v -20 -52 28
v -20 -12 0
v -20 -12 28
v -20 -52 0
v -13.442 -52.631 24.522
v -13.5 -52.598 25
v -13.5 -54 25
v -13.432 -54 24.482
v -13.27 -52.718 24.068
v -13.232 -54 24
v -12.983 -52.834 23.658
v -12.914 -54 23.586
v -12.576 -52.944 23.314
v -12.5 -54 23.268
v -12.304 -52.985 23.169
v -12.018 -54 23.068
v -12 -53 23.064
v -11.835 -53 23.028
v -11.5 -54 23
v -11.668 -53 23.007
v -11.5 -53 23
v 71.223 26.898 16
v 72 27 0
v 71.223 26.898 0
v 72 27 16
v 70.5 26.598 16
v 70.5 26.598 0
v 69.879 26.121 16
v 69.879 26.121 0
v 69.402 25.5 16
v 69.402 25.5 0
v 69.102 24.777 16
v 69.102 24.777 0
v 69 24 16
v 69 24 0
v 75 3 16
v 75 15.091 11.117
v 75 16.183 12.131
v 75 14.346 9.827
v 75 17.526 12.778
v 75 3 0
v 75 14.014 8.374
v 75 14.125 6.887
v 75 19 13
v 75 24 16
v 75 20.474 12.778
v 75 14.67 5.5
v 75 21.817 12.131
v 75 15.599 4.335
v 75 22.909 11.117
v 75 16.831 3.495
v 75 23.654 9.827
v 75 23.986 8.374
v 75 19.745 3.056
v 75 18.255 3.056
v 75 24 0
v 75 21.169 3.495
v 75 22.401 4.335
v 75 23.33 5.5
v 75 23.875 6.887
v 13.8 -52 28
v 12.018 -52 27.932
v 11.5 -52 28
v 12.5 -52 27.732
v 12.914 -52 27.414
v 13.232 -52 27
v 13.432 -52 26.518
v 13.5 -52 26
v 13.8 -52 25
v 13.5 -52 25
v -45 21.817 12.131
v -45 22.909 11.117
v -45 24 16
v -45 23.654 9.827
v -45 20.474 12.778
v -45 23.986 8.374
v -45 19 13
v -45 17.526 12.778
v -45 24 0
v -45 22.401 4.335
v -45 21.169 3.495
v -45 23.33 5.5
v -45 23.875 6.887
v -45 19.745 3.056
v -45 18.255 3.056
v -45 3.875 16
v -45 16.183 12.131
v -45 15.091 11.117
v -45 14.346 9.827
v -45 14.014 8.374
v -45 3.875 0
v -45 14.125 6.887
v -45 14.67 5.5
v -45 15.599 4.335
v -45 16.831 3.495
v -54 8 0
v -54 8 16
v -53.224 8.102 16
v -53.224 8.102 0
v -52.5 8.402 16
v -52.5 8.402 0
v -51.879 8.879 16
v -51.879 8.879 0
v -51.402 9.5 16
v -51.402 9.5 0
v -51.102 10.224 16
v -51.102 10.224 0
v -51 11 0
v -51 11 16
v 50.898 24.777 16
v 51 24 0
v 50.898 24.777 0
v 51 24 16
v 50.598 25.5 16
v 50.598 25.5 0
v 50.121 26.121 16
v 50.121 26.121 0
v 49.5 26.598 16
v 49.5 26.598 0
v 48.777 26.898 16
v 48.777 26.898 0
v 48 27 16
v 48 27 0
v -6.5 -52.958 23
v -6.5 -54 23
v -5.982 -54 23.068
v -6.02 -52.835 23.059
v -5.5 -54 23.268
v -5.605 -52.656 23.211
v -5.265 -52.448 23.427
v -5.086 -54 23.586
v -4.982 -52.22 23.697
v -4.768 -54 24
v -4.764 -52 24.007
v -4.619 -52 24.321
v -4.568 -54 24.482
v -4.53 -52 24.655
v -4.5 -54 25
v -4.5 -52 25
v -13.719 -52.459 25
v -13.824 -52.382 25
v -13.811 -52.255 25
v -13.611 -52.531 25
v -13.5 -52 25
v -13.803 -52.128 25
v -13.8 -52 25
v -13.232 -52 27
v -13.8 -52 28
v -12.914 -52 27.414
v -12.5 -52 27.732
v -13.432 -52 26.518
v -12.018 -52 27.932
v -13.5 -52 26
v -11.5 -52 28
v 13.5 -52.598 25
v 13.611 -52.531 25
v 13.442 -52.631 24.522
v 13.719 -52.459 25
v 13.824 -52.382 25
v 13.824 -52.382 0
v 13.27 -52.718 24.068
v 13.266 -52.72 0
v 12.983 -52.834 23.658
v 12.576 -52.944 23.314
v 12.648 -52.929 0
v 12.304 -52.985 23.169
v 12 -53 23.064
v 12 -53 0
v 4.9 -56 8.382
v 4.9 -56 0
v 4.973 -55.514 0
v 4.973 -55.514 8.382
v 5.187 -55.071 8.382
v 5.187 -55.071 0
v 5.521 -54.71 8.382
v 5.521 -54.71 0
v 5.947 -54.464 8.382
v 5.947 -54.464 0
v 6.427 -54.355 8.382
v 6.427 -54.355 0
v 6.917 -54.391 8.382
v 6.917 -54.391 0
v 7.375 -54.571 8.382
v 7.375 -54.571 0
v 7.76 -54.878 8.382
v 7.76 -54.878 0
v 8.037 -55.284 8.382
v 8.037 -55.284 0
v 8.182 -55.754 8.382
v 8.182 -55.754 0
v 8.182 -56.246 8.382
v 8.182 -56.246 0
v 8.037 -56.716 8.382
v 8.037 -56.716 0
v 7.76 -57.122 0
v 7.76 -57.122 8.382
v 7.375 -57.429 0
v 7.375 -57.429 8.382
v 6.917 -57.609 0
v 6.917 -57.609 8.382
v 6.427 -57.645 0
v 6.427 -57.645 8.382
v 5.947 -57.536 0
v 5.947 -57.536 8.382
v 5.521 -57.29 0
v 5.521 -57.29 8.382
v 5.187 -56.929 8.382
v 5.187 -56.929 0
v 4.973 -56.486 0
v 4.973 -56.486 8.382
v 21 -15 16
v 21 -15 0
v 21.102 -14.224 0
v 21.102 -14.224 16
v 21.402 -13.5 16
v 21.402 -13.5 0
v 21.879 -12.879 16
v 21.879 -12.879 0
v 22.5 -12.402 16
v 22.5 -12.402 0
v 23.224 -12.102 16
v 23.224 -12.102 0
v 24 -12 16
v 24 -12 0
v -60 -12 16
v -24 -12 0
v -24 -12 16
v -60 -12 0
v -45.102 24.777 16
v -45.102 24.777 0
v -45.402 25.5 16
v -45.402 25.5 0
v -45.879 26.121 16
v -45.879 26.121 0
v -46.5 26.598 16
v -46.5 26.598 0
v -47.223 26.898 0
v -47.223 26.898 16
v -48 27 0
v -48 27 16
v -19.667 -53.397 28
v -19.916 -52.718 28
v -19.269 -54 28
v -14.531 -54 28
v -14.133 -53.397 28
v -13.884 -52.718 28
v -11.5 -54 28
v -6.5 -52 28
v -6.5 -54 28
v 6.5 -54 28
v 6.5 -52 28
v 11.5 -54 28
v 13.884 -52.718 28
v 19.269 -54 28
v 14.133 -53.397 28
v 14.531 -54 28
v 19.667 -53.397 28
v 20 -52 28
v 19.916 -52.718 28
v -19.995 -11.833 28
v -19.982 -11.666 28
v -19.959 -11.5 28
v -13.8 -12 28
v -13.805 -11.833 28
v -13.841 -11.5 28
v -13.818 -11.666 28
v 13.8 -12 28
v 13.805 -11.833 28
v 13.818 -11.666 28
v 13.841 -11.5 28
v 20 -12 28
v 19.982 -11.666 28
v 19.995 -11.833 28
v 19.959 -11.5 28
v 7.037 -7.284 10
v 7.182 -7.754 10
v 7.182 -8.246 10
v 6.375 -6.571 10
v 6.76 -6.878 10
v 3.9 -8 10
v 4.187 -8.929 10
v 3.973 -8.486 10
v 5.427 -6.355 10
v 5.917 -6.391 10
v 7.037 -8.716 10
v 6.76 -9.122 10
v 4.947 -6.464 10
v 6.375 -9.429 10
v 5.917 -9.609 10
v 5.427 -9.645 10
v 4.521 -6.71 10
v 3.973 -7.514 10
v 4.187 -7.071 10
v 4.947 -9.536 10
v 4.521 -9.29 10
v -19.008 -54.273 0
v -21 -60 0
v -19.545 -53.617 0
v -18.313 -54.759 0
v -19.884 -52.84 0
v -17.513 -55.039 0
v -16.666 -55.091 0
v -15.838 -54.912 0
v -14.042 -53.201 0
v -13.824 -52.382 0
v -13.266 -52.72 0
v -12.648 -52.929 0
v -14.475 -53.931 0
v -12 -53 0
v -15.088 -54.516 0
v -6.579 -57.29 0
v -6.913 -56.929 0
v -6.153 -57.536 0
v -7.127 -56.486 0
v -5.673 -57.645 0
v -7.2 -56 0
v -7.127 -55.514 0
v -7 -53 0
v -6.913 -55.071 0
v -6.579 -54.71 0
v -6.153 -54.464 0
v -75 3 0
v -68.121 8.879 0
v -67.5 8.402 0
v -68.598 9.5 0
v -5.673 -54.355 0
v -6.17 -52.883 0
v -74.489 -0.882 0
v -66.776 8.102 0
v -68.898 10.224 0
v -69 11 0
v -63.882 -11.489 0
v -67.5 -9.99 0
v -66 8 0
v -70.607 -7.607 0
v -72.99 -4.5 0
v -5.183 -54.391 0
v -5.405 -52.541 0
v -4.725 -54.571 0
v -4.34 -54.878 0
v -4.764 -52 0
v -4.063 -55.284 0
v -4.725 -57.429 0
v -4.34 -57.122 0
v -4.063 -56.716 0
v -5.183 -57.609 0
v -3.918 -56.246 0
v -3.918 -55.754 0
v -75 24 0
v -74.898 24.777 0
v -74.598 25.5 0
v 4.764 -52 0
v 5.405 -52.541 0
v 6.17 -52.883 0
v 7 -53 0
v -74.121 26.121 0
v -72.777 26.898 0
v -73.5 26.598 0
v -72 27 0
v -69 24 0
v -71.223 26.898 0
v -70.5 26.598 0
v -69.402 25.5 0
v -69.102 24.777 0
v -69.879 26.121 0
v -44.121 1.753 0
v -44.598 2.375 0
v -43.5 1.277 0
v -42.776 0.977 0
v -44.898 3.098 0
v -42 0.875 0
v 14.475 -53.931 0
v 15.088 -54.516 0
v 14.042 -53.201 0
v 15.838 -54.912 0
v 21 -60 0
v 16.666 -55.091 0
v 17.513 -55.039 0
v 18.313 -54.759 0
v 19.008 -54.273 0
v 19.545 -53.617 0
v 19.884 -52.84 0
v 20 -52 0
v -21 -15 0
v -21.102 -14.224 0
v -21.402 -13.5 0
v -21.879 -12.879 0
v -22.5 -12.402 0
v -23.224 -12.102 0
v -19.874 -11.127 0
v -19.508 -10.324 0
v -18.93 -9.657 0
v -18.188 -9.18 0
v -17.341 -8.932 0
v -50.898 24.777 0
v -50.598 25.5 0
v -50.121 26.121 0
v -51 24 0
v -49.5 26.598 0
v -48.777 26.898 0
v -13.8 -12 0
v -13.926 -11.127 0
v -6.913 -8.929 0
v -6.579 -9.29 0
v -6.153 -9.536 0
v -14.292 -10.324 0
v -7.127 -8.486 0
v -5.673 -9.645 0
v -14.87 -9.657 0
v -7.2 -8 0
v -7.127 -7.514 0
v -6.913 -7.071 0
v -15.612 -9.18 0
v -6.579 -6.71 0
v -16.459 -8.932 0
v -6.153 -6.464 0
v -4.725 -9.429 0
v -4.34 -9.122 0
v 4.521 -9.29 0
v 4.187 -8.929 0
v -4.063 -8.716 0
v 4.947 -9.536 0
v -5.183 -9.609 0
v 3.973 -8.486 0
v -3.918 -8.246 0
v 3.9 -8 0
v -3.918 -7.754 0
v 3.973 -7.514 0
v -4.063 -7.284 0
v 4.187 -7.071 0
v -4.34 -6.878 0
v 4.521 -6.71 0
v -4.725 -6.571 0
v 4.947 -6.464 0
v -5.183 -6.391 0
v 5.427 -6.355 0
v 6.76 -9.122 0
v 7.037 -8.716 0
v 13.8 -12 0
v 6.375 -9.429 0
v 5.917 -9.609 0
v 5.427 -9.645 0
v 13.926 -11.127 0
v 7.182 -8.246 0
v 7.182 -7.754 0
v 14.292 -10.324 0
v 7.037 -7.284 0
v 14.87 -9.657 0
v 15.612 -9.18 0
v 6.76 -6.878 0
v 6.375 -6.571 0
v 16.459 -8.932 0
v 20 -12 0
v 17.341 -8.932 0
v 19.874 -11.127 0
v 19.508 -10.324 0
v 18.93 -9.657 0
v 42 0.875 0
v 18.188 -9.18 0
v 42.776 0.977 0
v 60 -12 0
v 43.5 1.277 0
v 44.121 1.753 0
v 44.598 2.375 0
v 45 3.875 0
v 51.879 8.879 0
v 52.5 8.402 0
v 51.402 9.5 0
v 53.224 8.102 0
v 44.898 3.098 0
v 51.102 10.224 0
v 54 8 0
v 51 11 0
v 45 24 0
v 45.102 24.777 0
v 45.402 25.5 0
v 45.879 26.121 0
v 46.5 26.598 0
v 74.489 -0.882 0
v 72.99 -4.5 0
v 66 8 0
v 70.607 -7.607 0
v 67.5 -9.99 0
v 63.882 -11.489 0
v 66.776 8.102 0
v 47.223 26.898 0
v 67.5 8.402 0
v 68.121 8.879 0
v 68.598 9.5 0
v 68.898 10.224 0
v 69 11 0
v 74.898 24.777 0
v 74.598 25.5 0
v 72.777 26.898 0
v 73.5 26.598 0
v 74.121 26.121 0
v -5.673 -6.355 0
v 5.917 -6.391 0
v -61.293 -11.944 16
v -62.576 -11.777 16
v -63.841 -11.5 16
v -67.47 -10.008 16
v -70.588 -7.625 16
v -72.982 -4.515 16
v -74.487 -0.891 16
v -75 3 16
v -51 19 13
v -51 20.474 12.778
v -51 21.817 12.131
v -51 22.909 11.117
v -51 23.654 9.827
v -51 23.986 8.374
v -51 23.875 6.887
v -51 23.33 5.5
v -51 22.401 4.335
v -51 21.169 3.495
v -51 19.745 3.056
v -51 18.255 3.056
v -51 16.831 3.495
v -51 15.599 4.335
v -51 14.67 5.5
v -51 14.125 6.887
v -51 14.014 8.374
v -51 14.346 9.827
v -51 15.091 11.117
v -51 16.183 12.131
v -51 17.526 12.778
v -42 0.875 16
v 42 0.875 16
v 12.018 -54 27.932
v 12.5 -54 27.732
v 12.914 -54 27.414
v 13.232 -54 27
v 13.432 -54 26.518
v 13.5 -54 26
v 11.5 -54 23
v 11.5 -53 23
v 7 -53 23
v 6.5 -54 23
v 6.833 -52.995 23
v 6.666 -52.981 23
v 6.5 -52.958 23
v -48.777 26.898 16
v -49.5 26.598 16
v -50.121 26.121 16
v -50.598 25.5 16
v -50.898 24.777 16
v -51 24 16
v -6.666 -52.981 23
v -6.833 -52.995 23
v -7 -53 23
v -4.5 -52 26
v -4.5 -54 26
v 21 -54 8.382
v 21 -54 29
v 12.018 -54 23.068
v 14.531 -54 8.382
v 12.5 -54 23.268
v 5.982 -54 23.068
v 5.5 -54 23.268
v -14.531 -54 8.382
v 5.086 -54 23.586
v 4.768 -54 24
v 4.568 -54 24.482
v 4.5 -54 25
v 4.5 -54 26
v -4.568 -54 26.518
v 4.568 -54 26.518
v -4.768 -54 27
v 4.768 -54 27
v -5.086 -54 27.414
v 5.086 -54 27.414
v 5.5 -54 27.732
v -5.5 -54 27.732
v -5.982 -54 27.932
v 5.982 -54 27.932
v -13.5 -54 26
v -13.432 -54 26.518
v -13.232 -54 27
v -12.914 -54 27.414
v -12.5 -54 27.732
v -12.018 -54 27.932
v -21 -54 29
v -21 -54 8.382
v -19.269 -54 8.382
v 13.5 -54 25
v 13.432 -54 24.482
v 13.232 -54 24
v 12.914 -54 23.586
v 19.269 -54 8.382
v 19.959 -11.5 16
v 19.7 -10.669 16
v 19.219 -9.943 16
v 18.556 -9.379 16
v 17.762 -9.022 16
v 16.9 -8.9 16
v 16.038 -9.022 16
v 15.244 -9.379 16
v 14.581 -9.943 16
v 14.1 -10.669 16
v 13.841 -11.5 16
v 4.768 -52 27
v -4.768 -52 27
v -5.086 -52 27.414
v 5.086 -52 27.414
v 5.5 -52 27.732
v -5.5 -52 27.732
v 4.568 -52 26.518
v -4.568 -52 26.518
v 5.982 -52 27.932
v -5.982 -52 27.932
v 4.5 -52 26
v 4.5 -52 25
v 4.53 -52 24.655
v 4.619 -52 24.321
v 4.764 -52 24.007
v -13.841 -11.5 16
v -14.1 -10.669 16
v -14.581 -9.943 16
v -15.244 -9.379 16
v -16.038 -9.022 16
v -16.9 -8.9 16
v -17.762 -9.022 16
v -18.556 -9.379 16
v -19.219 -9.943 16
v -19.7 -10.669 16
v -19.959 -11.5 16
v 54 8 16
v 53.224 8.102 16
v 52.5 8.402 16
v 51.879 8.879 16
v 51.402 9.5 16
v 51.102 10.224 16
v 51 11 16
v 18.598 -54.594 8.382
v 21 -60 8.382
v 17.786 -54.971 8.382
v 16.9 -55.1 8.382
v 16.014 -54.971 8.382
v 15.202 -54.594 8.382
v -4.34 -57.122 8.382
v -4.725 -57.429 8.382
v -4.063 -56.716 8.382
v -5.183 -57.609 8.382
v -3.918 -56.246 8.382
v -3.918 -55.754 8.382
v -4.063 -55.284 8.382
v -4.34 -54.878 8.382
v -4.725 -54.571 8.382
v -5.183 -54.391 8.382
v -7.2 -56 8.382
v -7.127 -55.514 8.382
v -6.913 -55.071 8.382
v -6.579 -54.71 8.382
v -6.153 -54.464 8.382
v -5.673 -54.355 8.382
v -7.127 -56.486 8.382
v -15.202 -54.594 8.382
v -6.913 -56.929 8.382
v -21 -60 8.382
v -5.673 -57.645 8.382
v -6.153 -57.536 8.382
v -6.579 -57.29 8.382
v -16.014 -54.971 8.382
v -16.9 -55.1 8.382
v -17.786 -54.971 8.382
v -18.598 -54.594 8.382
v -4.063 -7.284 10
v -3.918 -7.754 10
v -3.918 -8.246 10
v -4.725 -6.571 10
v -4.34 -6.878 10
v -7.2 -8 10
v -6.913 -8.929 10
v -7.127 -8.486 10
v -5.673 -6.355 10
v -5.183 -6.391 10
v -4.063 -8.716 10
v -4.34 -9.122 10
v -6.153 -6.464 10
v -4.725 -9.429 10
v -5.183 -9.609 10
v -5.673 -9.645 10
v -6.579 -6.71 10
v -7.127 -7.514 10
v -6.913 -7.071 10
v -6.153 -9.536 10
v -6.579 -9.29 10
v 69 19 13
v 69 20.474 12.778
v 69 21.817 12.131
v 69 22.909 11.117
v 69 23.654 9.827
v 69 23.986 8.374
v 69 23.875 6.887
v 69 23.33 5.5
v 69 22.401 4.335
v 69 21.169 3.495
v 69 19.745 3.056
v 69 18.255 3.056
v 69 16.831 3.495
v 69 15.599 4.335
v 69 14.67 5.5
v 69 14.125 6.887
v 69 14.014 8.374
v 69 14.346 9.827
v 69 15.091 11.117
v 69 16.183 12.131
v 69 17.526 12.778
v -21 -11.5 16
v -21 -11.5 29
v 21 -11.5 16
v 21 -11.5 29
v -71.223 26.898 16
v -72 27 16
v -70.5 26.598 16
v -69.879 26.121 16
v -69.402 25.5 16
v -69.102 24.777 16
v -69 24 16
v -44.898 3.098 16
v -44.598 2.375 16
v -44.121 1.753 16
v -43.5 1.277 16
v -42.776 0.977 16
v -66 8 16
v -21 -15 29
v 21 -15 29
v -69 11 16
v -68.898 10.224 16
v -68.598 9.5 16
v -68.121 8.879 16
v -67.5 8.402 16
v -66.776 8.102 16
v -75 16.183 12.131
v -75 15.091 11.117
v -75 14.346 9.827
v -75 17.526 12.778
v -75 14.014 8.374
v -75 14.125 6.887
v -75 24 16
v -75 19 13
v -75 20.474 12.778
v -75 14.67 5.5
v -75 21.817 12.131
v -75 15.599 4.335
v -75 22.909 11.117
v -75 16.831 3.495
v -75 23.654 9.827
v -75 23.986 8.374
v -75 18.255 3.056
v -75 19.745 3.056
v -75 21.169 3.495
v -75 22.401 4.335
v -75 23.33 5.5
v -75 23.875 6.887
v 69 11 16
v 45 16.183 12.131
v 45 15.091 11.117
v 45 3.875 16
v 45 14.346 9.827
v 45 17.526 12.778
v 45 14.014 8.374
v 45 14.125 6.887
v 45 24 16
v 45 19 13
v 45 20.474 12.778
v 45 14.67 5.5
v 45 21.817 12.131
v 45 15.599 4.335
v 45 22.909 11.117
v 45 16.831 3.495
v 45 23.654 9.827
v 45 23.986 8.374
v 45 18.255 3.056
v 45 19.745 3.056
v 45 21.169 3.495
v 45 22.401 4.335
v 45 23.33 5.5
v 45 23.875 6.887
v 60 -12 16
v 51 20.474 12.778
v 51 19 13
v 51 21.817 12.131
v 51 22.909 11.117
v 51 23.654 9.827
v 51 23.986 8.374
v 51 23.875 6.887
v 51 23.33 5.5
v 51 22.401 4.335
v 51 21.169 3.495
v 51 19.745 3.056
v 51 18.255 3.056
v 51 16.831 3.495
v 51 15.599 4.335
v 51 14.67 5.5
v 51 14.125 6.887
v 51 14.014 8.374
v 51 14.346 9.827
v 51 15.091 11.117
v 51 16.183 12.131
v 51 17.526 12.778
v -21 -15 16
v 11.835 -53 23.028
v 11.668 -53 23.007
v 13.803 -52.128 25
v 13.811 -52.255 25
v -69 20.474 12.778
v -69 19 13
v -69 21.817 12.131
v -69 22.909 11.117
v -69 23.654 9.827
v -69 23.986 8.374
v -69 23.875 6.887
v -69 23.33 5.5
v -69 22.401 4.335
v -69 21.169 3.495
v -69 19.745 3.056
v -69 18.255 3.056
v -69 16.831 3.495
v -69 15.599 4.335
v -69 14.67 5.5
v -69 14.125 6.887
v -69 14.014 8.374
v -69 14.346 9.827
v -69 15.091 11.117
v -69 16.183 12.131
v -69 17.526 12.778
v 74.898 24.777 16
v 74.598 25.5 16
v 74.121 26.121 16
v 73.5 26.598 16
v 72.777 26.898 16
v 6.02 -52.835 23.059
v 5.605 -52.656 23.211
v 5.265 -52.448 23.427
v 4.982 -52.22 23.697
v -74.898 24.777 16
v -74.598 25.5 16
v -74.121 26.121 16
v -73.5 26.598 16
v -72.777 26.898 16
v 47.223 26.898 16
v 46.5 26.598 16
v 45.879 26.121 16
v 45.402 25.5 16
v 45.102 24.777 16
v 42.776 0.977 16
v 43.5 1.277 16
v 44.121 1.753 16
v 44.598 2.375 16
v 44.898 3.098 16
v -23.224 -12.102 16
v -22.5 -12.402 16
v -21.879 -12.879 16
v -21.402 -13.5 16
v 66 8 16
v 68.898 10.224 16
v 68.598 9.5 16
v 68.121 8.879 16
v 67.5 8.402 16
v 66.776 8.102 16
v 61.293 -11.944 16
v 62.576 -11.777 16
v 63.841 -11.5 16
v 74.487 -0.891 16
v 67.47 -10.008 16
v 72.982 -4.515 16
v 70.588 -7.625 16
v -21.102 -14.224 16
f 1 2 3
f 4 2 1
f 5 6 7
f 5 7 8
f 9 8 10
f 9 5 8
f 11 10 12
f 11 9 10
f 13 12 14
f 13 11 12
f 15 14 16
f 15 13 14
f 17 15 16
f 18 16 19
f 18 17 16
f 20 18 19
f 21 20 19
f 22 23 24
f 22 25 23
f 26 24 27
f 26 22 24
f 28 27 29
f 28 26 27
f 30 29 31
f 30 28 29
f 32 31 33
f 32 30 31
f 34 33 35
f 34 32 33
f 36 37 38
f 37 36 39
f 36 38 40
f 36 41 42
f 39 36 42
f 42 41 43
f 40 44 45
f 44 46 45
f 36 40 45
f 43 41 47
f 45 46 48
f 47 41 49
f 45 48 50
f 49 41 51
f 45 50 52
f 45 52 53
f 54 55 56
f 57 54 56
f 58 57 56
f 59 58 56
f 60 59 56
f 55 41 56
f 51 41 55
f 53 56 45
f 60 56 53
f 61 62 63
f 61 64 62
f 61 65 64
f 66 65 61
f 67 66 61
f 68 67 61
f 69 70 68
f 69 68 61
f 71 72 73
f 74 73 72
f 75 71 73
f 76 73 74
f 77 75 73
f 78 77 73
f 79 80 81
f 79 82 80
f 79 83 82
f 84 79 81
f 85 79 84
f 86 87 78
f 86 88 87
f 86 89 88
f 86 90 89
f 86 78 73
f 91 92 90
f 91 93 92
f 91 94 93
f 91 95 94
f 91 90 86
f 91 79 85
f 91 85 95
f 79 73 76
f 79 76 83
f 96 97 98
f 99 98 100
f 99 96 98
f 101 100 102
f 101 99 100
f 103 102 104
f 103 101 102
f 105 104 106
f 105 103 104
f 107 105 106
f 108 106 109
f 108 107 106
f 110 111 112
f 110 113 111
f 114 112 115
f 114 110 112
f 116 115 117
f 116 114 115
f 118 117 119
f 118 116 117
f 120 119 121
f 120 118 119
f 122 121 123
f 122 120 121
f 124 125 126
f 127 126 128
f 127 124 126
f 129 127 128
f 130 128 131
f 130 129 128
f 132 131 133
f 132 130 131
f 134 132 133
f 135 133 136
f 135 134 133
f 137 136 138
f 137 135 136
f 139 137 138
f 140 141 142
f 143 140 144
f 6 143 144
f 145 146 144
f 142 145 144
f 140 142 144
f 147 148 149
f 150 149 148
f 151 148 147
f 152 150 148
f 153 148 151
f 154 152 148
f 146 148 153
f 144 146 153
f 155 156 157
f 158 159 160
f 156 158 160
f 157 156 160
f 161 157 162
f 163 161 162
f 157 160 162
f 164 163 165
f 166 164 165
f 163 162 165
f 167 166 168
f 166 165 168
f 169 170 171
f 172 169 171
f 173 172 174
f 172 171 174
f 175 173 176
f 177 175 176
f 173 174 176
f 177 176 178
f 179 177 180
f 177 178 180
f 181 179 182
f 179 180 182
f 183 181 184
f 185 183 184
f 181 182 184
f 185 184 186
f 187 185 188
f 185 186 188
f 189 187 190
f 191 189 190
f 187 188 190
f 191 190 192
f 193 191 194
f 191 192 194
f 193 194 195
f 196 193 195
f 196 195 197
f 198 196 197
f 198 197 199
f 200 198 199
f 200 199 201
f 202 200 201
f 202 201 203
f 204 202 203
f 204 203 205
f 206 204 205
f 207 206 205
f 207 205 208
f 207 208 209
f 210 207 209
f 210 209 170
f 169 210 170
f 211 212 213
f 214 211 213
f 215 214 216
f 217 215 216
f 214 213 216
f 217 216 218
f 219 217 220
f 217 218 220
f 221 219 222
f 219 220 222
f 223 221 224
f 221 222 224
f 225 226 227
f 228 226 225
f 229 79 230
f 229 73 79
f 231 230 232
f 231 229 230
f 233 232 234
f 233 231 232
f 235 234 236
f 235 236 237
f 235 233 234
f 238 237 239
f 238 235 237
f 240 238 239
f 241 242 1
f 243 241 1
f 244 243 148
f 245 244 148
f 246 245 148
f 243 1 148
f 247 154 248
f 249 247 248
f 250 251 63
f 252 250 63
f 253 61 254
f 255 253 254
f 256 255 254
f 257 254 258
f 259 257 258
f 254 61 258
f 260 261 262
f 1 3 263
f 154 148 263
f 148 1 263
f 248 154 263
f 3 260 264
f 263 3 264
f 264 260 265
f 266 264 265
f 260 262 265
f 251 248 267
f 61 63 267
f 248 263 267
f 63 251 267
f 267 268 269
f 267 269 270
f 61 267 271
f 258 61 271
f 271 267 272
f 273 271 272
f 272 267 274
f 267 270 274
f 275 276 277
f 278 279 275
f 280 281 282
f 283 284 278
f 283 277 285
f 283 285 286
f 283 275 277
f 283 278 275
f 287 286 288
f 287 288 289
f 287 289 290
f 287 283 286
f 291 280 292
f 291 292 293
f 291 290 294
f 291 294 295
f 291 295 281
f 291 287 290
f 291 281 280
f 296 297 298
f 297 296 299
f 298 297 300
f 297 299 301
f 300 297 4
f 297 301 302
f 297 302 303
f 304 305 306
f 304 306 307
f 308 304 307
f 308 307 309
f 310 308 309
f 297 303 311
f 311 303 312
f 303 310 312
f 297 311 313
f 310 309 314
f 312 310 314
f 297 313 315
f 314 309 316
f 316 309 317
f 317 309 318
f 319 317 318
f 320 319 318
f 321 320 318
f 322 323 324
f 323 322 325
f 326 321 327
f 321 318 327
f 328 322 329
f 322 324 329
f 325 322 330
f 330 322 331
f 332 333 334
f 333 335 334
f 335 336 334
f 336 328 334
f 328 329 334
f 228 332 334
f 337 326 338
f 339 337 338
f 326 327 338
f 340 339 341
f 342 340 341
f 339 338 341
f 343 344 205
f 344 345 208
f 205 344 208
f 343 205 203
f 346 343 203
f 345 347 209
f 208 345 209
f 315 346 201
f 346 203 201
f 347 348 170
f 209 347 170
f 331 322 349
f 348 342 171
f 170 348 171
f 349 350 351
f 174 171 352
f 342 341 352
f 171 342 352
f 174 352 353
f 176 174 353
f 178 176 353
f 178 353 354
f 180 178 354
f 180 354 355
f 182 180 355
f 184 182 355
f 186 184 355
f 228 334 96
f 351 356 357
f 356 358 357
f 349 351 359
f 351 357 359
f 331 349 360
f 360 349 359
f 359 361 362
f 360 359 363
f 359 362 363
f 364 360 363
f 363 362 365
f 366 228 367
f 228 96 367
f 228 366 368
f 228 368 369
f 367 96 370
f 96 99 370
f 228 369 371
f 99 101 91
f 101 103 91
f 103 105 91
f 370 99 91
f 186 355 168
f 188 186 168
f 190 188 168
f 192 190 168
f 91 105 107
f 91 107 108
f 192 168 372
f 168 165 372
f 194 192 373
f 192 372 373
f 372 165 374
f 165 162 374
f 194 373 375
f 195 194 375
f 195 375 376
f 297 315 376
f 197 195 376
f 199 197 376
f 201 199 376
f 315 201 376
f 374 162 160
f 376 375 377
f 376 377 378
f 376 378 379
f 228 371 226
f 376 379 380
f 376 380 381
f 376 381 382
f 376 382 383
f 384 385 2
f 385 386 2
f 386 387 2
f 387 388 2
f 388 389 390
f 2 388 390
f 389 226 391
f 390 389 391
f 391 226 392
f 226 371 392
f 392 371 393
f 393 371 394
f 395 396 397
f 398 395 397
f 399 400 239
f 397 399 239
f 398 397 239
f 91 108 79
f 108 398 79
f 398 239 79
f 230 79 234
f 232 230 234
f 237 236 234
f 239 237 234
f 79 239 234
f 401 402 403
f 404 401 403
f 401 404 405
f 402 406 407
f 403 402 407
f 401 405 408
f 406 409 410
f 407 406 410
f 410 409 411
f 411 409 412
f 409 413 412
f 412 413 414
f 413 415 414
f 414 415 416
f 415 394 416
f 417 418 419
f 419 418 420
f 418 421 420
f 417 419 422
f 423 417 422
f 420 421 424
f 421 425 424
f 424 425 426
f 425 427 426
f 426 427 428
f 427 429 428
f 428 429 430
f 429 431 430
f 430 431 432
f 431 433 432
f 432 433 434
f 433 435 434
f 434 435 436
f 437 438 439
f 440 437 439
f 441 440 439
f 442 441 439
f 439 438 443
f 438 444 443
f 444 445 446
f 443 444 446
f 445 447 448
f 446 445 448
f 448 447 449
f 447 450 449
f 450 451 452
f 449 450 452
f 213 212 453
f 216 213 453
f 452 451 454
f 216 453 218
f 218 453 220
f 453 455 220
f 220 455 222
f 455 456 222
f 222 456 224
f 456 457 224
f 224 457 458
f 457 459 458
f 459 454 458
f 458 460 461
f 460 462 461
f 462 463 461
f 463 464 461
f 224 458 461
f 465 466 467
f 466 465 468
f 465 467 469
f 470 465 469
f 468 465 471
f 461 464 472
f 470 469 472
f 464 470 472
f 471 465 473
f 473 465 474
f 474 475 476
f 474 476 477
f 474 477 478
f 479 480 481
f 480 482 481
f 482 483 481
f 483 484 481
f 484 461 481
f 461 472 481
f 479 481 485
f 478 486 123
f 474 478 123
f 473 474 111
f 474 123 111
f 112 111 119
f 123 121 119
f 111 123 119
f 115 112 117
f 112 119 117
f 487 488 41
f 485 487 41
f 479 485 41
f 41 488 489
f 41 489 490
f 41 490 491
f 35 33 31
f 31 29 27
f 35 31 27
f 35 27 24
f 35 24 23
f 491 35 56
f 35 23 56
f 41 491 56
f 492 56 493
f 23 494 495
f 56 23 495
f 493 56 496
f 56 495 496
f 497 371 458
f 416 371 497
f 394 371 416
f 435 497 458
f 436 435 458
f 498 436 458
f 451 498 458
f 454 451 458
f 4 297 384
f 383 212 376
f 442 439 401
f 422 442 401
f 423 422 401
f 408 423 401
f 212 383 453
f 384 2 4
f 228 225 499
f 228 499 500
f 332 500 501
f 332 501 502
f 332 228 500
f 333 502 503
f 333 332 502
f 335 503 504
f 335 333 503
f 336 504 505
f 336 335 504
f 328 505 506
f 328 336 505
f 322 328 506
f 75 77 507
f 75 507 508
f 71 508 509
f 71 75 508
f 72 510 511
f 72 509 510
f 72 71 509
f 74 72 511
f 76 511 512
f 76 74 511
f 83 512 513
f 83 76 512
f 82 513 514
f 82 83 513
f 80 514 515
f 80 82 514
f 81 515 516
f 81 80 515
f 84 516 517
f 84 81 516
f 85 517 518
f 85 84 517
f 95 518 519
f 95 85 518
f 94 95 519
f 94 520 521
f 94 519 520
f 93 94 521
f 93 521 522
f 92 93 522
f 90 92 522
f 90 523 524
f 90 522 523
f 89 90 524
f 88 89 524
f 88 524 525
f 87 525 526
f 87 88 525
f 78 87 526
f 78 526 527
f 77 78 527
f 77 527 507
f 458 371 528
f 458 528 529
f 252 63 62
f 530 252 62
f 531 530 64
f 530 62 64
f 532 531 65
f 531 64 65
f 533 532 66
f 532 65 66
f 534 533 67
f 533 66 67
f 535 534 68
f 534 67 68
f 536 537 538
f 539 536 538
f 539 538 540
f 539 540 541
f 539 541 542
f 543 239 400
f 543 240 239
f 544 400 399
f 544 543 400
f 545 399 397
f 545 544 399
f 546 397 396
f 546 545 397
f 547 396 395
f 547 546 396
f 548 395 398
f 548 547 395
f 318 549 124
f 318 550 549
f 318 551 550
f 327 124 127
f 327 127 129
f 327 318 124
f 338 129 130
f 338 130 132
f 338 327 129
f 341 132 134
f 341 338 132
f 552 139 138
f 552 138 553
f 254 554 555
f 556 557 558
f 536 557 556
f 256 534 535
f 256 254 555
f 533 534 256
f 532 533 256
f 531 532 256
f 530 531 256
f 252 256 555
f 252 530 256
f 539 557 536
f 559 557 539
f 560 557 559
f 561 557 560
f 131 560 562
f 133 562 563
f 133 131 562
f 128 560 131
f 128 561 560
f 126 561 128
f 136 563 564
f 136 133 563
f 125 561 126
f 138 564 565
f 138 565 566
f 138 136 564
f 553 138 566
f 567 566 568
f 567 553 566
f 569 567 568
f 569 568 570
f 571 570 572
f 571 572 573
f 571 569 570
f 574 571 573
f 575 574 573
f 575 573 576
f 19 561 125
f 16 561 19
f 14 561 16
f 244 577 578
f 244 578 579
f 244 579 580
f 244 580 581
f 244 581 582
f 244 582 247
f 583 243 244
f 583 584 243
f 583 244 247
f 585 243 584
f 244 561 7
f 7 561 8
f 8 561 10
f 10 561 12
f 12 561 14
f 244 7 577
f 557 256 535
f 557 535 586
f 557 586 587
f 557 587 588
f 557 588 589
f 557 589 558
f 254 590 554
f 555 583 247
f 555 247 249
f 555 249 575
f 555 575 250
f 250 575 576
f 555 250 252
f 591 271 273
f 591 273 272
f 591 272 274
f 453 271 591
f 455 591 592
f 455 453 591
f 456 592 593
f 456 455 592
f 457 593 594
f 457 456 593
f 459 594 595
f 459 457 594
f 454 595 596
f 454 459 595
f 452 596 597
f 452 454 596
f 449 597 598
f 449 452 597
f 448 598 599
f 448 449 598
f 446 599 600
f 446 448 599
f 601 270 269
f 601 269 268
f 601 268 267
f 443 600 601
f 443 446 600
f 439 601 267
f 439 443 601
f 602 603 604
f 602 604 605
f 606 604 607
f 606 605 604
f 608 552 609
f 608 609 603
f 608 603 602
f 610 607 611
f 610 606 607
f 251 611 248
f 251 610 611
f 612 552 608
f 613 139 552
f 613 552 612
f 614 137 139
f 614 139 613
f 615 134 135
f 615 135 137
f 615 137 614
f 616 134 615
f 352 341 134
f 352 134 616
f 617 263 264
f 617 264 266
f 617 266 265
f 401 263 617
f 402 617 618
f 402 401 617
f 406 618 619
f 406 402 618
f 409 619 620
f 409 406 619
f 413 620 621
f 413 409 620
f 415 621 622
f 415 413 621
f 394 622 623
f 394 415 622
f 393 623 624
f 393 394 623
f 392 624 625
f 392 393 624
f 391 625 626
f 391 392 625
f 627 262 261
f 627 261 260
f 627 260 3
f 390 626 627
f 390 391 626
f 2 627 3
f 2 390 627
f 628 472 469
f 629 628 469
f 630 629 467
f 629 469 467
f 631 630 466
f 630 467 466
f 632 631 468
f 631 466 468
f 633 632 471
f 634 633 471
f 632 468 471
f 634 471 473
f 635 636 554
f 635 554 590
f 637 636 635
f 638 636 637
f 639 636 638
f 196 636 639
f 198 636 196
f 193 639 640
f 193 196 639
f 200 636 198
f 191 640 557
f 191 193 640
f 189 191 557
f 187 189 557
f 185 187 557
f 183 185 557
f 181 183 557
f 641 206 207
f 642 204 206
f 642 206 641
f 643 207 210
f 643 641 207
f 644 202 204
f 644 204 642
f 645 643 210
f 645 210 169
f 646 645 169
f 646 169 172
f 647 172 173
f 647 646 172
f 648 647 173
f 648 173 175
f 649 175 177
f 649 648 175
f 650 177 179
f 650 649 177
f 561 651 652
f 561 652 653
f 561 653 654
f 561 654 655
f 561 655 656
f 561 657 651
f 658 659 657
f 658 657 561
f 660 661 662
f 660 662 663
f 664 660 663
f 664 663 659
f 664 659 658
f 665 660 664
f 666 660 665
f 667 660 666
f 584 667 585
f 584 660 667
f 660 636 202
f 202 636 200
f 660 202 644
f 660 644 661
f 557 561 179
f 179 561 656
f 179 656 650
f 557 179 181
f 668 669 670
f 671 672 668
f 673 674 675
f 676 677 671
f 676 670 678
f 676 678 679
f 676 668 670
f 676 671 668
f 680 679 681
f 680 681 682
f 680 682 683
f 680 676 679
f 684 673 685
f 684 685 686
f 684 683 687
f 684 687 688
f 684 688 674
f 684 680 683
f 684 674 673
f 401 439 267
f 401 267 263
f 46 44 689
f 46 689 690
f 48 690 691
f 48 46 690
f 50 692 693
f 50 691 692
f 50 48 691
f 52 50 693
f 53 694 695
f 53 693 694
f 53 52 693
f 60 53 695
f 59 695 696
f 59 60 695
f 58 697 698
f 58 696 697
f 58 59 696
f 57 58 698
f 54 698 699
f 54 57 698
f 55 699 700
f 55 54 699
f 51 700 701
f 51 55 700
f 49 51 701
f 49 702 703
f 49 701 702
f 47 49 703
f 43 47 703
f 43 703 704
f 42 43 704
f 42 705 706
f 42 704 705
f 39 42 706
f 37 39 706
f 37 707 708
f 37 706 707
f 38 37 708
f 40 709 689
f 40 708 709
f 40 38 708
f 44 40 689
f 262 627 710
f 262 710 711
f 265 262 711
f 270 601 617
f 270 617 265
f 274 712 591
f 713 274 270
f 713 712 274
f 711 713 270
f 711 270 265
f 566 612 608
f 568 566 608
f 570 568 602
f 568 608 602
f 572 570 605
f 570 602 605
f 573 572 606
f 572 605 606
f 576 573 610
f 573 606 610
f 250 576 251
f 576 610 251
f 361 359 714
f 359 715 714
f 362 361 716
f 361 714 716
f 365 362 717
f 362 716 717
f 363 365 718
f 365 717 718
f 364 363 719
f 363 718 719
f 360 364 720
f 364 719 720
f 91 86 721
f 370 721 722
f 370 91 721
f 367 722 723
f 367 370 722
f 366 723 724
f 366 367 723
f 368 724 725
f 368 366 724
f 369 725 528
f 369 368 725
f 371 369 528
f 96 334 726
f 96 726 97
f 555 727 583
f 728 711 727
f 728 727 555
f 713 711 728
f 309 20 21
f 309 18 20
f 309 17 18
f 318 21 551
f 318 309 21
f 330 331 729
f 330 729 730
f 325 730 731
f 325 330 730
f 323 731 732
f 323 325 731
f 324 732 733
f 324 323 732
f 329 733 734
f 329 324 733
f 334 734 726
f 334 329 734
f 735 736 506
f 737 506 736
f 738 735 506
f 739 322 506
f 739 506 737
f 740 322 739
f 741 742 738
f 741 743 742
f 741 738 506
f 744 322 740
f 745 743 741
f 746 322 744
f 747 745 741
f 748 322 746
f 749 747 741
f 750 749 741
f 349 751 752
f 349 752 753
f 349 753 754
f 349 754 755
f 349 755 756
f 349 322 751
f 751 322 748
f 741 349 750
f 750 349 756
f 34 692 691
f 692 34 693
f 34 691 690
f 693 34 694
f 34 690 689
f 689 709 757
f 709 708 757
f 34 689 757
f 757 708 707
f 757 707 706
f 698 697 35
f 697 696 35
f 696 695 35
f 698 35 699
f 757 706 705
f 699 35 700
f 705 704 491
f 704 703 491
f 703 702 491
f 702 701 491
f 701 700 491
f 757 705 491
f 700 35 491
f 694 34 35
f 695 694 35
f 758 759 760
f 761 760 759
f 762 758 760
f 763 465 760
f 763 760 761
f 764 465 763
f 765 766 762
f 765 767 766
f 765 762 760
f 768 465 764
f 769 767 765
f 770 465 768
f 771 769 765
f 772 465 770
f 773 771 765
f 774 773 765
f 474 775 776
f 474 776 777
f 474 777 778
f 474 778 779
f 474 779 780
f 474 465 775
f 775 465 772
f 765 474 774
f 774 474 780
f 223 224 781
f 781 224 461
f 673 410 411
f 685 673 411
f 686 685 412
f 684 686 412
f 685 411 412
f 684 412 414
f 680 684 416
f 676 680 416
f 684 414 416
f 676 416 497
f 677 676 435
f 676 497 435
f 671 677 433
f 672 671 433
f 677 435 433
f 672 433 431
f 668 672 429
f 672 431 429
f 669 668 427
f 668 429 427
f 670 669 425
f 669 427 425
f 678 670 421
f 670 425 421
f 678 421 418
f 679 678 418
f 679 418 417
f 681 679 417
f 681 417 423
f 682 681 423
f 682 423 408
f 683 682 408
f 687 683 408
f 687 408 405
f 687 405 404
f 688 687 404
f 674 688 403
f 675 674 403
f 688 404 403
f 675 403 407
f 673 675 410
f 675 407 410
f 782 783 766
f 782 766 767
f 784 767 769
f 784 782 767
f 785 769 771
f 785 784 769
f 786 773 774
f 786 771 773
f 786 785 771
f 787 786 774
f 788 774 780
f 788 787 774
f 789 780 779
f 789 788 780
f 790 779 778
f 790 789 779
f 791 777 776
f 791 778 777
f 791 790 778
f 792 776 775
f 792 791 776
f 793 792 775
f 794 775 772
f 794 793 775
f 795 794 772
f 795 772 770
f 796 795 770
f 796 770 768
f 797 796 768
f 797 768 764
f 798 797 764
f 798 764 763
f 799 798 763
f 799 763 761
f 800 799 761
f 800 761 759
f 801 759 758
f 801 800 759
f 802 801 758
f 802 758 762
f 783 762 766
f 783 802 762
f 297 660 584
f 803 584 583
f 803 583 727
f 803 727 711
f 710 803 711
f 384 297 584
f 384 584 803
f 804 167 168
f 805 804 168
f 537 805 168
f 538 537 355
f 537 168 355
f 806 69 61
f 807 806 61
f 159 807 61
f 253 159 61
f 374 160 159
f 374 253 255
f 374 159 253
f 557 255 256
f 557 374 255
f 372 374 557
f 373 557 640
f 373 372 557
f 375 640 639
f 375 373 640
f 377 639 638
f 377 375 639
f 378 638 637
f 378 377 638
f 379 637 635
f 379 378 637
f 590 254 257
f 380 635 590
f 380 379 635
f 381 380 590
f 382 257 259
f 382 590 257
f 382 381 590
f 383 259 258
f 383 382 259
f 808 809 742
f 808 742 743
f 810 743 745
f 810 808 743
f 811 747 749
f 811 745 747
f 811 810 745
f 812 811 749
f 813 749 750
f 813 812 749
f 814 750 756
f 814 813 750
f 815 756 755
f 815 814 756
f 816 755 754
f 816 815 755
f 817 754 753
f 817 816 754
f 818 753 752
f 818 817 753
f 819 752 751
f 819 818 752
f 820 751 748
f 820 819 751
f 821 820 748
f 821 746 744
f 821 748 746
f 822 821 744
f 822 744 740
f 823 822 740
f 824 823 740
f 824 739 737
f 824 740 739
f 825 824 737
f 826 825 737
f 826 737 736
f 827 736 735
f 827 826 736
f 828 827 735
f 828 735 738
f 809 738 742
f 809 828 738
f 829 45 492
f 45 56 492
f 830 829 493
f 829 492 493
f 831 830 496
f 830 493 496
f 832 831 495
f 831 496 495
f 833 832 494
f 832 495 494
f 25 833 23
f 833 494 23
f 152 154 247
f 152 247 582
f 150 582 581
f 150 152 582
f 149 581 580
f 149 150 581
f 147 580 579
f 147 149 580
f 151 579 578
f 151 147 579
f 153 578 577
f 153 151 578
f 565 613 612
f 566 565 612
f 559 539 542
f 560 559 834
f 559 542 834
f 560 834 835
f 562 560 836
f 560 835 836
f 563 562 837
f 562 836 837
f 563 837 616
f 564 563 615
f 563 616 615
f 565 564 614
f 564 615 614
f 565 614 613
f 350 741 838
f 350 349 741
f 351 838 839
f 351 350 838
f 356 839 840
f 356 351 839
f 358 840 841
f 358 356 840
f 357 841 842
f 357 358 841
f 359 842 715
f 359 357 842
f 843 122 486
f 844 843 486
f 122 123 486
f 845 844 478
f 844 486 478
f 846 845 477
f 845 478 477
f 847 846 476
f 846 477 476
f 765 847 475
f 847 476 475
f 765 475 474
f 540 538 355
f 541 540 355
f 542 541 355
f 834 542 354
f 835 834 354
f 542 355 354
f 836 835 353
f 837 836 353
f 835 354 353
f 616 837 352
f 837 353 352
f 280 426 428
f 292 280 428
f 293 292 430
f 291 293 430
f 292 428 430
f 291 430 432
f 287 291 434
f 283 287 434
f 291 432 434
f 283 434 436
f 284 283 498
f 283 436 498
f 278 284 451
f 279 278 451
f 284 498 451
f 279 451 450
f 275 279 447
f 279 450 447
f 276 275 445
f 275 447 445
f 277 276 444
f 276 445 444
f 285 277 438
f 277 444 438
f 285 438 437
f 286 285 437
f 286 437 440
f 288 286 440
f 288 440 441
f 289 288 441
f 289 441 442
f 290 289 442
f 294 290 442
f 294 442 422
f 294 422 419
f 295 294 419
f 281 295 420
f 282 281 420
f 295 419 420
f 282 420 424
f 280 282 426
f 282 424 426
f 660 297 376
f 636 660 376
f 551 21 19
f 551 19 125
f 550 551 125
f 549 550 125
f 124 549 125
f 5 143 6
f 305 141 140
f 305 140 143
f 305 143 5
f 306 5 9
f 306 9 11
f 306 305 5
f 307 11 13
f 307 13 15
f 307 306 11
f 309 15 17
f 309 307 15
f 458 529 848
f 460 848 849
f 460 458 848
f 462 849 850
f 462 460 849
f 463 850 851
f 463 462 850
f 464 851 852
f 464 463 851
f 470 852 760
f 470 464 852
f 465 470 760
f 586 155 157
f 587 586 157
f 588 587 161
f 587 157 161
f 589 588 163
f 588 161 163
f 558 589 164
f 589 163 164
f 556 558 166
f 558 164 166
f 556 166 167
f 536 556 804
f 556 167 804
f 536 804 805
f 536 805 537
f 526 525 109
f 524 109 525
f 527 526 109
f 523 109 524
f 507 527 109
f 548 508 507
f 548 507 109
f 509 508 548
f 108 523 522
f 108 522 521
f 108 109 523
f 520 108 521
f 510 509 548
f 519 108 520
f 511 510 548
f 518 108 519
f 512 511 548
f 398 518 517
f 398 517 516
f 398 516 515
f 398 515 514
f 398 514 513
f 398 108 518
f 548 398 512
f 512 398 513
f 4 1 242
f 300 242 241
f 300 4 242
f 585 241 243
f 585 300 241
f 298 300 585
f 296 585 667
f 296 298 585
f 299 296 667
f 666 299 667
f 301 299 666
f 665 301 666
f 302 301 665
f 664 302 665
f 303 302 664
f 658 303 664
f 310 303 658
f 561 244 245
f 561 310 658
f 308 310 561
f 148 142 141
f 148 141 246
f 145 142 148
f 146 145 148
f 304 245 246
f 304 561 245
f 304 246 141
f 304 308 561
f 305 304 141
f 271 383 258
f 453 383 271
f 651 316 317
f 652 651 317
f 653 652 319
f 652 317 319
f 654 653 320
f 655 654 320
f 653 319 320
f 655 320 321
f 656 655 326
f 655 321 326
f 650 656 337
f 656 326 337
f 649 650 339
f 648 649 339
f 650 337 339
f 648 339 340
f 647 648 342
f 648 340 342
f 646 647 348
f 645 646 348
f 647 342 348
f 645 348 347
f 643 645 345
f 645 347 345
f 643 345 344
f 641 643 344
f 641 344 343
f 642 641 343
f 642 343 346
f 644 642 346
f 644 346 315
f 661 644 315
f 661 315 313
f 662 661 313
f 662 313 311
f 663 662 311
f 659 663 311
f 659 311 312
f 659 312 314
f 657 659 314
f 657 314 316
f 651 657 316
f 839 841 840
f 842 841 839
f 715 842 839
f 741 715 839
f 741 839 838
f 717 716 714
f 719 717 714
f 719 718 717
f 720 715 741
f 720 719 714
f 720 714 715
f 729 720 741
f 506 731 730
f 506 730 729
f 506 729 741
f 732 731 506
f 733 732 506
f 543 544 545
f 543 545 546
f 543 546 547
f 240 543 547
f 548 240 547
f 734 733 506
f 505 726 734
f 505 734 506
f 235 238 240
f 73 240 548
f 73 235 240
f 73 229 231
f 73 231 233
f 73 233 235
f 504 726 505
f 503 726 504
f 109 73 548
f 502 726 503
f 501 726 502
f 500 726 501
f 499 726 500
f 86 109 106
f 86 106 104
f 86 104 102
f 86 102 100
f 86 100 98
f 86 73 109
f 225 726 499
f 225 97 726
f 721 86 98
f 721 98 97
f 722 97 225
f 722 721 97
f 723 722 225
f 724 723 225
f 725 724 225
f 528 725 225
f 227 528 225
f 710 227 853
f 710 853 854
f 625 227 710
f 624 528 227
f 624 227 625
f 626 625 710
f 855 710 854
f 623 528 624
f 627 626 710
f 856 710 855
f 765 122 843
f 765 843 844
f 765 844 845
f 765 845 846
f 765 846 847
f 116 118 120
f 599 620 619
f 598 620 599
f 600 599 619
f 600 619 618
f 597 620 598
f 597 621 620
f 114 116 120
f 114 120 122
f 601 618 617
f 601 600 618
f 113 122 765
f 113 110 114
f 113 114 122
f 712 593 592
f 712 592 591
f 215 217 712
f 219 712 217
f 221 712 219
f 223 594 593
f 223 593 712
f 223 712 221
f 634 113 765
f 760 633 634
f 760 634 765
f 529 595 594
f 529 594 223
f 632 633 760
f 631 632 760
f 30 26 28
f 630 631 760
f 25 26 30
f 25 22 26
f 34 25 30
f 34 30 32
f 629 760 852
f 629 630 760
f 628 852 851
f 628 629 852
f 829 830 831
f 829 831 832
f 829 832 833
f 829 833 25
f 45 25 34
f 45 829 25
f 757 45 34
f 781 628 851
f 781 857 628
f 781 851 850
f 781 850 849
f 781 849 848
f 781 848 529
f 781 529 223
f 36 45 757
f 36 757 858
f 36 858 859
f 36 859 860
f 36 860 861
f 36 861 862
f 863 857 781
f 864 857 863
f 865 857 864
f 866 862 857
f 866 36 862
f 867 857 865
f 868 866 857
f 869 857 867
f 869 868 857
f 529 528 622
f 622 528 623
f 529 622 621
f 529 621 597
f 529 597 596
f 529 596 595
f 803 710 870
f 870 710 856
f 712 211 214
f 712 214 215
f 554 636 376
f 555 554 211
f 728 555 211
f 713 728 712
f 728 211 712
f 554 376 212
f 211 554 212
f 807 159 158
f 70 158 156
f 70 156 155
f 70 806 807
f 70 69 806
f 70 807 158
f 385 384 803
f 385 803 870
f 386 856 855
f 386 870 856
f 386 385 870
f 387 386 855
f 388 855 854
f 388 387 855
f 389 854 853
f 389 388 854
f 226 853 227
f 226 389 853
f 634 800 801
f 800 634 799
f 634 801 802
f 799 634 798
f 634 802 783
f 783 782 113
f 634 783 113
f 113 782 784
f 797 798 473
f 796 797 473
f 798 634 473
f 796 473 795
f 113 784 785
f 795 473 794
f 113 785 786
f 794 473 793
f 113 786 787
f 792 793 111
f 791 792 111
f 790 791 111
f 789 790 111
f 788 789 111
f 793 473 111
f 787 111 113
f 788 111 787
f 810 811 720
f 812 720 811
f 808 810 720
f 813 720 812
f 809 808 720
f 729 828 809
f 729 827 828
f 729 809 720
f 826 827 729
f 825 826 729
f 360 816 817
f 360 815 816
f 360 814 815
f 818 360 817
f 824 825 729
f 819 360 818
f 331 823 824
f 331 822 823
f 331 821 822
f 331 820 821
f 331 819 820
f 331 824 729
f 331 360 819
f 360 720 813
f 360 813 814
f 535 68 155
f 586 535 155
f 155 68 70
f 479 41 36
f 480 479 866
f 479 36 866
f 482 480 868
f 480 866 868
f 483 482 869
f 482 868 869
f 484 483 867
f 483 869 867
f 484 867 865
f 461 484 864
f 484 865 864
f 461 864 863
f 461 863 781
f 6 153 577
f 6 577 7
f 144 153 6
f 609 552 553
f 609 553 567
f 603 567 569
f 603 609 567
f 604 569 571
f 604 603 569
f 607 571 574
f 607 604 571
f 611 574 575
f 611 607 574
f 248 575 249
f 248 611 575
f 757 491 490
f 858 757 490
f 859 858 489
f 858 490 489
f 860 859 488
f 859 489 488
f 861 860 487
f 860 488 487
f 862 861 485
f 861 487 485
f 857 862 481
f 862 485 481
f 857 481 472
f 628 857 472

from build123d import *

# Parameters (mm, degrees)
ESQUISSE1_W                  = 150
ESQUISSE1_H                  = 120
BOSS_EXTRU_1_DEPTH           = 29
ENL_V_MAT_EXTRU_1_DEPTH      = 28
ENL_V_MAT_EXTRU_2_DEPTH      = 101.329457289
ENL_V_MAT_EXTRU_3_DEPTH      = 101.329457289
ENL_V_MAT_EXTRU_4_DEPTH      = 165.137137784
ENL_V_MAT_EXTRU_4_DEPTH_BACK = 165.137137784
ESQUISSE6_R                  = 5
ENL_V_MAT_EXTRU_6_DEPTH      = 165.137137784
ENL_V_MAT_EXTRU_6_DEPTH_BACK = 165.137137784
ENL_V_MAT_EXTRU_8_DEPTH      = 28
ESQUISSE13_R                 = 1.65
ENL_V_MAT_EXTRU_9_DEPTH      = 10
CONG_1_DEPTH                 = 30
CONG_2_R                     = 15
ESQUISSE14_W                 = 20.617821527
ESQUISSE14_H                 = 6
ENL_V_MAT_EXTRU_10_DEPTH     = 117.86316785
ENL_V_MAT_EXTRU_11_DEPTH     = 10
ENL_V_MAT_EXTRU_14_DEPTH     = 25
CONG_6_R                     = 3
ESQUISSE17_W                 = 39.451580469
ESQUISSE17_H                 = 13
ENL_V_MAT_EXTRU_15_DEPTH     = 22
ESQUISSE18_W                 = 3.388992405
ESQUISSE18_H                 = 13
ENL_V_MAT_EXTRU_16_DEPTH     = 22


with BuildPart() as part:
    # Esquisse1 → Boss.-Extru.1 (new body)
    with BuildSketch(Plane.XY):
        Rectangle(ESQUISSE1_W, ESQUISSE1_H)
    extrude(amount=BOSS_EXTRU_1_DEPTH)

    # Esquisse2 → Enlèv. mat.-Extru.1 (cut)
    with BuildSketch(Plane(origin=(0, 0, 0), x_dir=(-1, 0, 0), z_dir=(0, 0, -1))):
        with BuildLine():
            Line((-13.8, -12), (13.8, -12))
            ThreePointArc((13.8, -12), (16.9, -8.9), (20, -12))
            Line((20, -12), (20, -52))
            ThreePointArc((20, -52), (16.9, -55.1), (13.8, -52))
            Line((13.8, -52), (-13.8, -52))
            ThreePointArc((-13.8, -52), (-16.9, -55.1), (-20, -52))
            Line((-20, -52), (-20, -12))
            ThreePointArc((-20, -12), (-16.9, -8.9), (-13.8, -12))
        make_face()
    extrude(amount=-ENL_V_MAT_EXTRU_1_DEPTH, mode=Mode.SUBTRACT)

    # Esquisse3 → Enlèv. mat.-Extru.2 (cut, through all)
    with BuildSketch(Plane(origin=(0, 0, 0), x_dir=(-1, 0, 0), z_dir=(0, 0, -1))):
        with BuildLine():
            Line((-24, -12), (-75, -12))
            Line((-75, -12), (-75, -60))
            Line((-75, -60), (-21, -60))
            Line((-21, -60), (-21, -15))
            ThreePointArc((-21, -15), (-21.878679656, -12.878679656), (-24, -12))
        make_face()
        with BuildLine():
            Line((24, -12), (75, -12))
            Line((75, -12), (75, -60))
            Line((75, -60), (21, -60))
            Line((21, -60), (21, -15))
            ThreePointArc((21, -15), (21.878679656, -12.878679656), (24, -12))
        make_face()
    extrude(amount=-ENL_V_MAT_EXTRU_2_DEPTH, mode=Mode.SUBTRACT)

    # Esquisse5 → Enlèv. mat.-Extru.3 (cut, through all)
    with BuildSketch(Plane(origin=(0, 0, 0), x_dir=(-1, 0, 0), z_dir=(0, 0, -1))):
        with BuildLine():
            Line((-45, 60), (45, 60))
            Line((45, 60), (45, 3.874810027))
            ThreePointArc((45, 3.874810027), (44.121320344, 1.753489683), (42, 0.874810027))
            Line((42, 0.874810027), (-42, 0.874810027))
            ThreePointArc((-42, 0.874810027), (-44.121320344, 1.753489683), (-45, 3.874810027))
            Line((-45, 3.874810027), (-45, 60))
        make_face()
    extrude(amount=-ENL_V_MAT_EXTRU_3_DEPTH, mode=Mode.SUBTRACT)

    # Esquisse6 → Enlèv. mat.-Extru.4 (cut, two sides: drawn at the far end of the back side and taken through both)
    with BuildSketch(Plane.ZY.offset(75).offset(-ENL_V_MAT_EXTRU_4_DEPTH_BACK)):
        with Locations((8, 19)):
            Circle(ESQUISSE6_R)
    extrude(amount=ENL_V_MAT_EXTRU_4_DEPTH + ENL_V_MAT_EXTRU_4_DEPTH_BACK, mode=Mode.SUBTRACT)

    # Esquisse9 → Enlèv. mat.-Extru.6 (cut, two sides: drawn at the far end of the back side and taken through both)
    with BuildSketch(Plane.ZY.offset(75).offset(-ENL_V_MAT_EXTRU_6_DEPTH_BACK)):
        Polygon((0, 27), (16, 27), (16, -11.5), (29, -11.5), (29, 60), (0, 60), align=None)
    extrude(amount=ENL_V_MAT_EXTRU_6_DEPTH + ENL_V_MAT_EXTRU_6_DEPTH_BACK, mode=Mode.SUBTRACT)

    # Esquisse12 → Enlèv. mat.-Extru.8 (cut)
    with BuildSketch(Plane(origin=(0, 0, 0), x_dir=(-1, 0, 0), z_dir=(0, 0, -1))):
        with BuildLine():
            Line((-69, 27), (-69, 11))
            ThreePointArc((-69, 11), (-68.121320344, 8.878679656), (-66, 8))
            Line((-66, 8), (-54, 8))
            ThreePointArc((-54, 8), (-51.878679656, 8.878679656), (-51, 11))
            Line((-51, 11), (-51, 27))
            Line((-51, 27), (-69, 27))
        make_face()
    enl_v_mat_extru_8 = extrude(amount=-ENL_V_MAT_EXTRU_8_DEPTH, mode=Mode.SUBTRACT)

    # Symétrie1: Enlèv. mat.-Extru.8 across plane
    add(enl_v_mat_extru_8.mirror(Plane(origin=(0, 0, 0), x_dir=(0, 0, 1), z_dir=(1, 0, 0))), mode=Mode.SUBTRACT)

    # Esquisse13 → Enlèv. mat.-Extru.9 (cut)
    with BuildSketch(Plane(origin=(0, 0, 0), x_dir=(-1, 0, 0), z_dir=(0, 0, -1))):
        with Locations((-5.55, -8)):
            Circle(ESQUISSE13_R)
        with Locations((5.55, -8)):
            Circle(ESQUISSE13_R)
        with Locations((-6.55, -56)):
            Circle(ESQUISSE13_R)
        with Locations((5.55, -56)):
            Circle(ESQUISSE13_R)
    extrude(amount=-ENL_V_MAT_EXTRU_9_DEPTH, mode=Mode.SUBTRACT)

    # Congé1: read off the stored shape, not the designer's step
    # Congé1 outline → Congé1 (cut)
    with BuildSketch(Plane.XY):
        with BuildLine():
            Line((-75, -12), (-60, -12))
            ThreePointArc((-60, -12), (-70.606601718, -7.606601718), (-75, 3))
            Line((-75, 3), (-75, -12))
        make_face()
    extrude(amount=CONG_1_DEPTH, mode=Mode.SUBTRACT)

    # Congé2
    cong_2_edges = [part.edges().sort_by_distance(p)[0] for p in [
        (75, -12, 14.5),
    ]]
    fillet(cong_2_edges, radius=CONG_2_R)

    # Esquisse14 → Enlèv. mat.-Extru.10 (cut, through all)
    with BuildSketch(Plane.ZY.offset(21)):
        with Locations((18.691089237, -57)):
            Rectangle(ESQUISSE14_W, ESQUISSE14_H)
    extrude(amount=-ENL_V_MAT_EXTRU_10_DEPTH, mode=Mode.SUBTRACT)

    # Esquisse15 → Enlèv. mat.-Extru.11 (cut)
    with BuildSketch(Plane(origin=(0, -52, 0), x_dir=(1, 0, 0), z_dir=(0, 1, 0))):
        with BuildLine():
            Line((-13.5, -26), (-13.5, -25))
            ThreePointArc((-13.5, -25), (-12.914213562, -23.585786438), (-11.5, -23))
            Line((-11.5, -23), (-6.5, -23))
            ThreePointArc((-6.5, -23), (-5.085786438, -23.585786438), (-4.5, -25))
            Line((-4.5, -25), (-4.5, -26))
            ThreePointArc((-4.5, -26), (-5.085786438, -27.414213562), (-6.5, -28))
            Line((-6.5, -28), (-11.5, -28))
            ThreePointArc((-11.5, -28), (-12.914213562, -27.414213562), (-13.5, -26))
        make_face()
    enl_v_mat_extru_11 = extrude(amount=-ENL_V_MAT_EXTRU_11_DEPTH, mode=Mode.SUBTRACT)

    # Symétrie4: Enlèv. mat.-Extru.11 across plane
    add(enl_v_mat_extru_11.mirror(Plane(origin=(0, 0, 0), x_dir=(0, 0, 1), z_dir=(1, 0, 0))), mode=Mode.SUBTRACT)

    # Esquisse16 → Enlèv. mat.-Extru.14 (cut)
    with BuildSketch(Plane(origin=(0, 0, 0), x_dir=(-1, 0, 0), z_dir=(0, 0, -1))):
        with BuildLine():
            Line((-12, -53), (-7, -53))
            ThreePointArc((-7, -53), (-4.878679656, -52.121320344), (-4, -50))
            Line((-4, -50), (-15, -50))
            ThreePointArc((-15, -50), (-14.121320344, -52.121320344), (-12, -53))
        make_face()
    enl_v_mat_extru_14 = extrude(amount=-ENL_V_MAT_EXTRU_14_DEPTH, mode=Mode.SUBTRACT)

    # Symétrie5: Enlèv. mat.-Extru.14 across plane
    add(enl_v_mat_extru_14.mirror(Plane(origin=(0, 0, 0), x_dir=(0, 0, 1), z_dir=(1, 0, 0))), mode=Mode.SUBTRACT)

    # Congé6
    cong_6_edges = [part.edges().sort_by_distance(p)[0] for p in [
        (-75, 27, 8),
        (-69, 27, 8),
        (-45, 27, 8),
        (-51, 27, 8),
        (75, 27, 8),
        (69, 27, 8),
        (51, 27, 8),
        (45, 27, 8),
    ]]
    fillet(cong_6_edges, radius=CONG_6_R - 0.0001)  # a hair under: the kernel refuses the full size

    # Esquisse17 → Enlèv. mat.-Extru.15 (cut)
    with BuildSketch(Plane(origin=(0, -11.5, 0), x_dir=(1, 0, 0), z_dir=(0, 1, 0))):
        with Locations((44.114782639, -22.5)):
            Rectangle(ESQUISSE17_W, ESQUISSE17_H)
    enl_v_mat_extru_15 = extrude(amount=-ENL_V_MAT_EXTRU_15_DEPTH, mode=Mode.SUBTRACT)

    # Symétrie6: Enlèv. mat.-Extru.15 across plane
    add(enl_v_mat_extru_15.mirror(Plane(origin=(0, 0, 0), x_dir=(0, 0, 1), z_dir=(1, 0, 0))), mode=Mode.SUBTRACT)

    # Esquisse18 → Enlèv. mat.-Extru.16 (cut)
    with BuildSketch(Plane(origin=(0, -11.5, 0), x_dir=(1, 0, 0), z_dir=(0, 1, 0))):
        with Locations((22.694496202, -22.5)):
            Rectangle(ESQUISSE18_W, ESQUISSE18_H)
    enl_v_mat_extru_16 = extrude(amount=-ENL_V_MAT_EXTRU_16_DEPTH, mode=Mode.SUBTRACT)

    # Symétrie7: Enlèv. mat.-Extru.16 across plane
    add(enl_v_mat_extru_16.mirror(Plane(origin=(0, 0, 0), x_dir=(0, 0, 1), z_dir=(1, 0, 0))), mode=Mode.SUBTRACT)


solid = part.part
